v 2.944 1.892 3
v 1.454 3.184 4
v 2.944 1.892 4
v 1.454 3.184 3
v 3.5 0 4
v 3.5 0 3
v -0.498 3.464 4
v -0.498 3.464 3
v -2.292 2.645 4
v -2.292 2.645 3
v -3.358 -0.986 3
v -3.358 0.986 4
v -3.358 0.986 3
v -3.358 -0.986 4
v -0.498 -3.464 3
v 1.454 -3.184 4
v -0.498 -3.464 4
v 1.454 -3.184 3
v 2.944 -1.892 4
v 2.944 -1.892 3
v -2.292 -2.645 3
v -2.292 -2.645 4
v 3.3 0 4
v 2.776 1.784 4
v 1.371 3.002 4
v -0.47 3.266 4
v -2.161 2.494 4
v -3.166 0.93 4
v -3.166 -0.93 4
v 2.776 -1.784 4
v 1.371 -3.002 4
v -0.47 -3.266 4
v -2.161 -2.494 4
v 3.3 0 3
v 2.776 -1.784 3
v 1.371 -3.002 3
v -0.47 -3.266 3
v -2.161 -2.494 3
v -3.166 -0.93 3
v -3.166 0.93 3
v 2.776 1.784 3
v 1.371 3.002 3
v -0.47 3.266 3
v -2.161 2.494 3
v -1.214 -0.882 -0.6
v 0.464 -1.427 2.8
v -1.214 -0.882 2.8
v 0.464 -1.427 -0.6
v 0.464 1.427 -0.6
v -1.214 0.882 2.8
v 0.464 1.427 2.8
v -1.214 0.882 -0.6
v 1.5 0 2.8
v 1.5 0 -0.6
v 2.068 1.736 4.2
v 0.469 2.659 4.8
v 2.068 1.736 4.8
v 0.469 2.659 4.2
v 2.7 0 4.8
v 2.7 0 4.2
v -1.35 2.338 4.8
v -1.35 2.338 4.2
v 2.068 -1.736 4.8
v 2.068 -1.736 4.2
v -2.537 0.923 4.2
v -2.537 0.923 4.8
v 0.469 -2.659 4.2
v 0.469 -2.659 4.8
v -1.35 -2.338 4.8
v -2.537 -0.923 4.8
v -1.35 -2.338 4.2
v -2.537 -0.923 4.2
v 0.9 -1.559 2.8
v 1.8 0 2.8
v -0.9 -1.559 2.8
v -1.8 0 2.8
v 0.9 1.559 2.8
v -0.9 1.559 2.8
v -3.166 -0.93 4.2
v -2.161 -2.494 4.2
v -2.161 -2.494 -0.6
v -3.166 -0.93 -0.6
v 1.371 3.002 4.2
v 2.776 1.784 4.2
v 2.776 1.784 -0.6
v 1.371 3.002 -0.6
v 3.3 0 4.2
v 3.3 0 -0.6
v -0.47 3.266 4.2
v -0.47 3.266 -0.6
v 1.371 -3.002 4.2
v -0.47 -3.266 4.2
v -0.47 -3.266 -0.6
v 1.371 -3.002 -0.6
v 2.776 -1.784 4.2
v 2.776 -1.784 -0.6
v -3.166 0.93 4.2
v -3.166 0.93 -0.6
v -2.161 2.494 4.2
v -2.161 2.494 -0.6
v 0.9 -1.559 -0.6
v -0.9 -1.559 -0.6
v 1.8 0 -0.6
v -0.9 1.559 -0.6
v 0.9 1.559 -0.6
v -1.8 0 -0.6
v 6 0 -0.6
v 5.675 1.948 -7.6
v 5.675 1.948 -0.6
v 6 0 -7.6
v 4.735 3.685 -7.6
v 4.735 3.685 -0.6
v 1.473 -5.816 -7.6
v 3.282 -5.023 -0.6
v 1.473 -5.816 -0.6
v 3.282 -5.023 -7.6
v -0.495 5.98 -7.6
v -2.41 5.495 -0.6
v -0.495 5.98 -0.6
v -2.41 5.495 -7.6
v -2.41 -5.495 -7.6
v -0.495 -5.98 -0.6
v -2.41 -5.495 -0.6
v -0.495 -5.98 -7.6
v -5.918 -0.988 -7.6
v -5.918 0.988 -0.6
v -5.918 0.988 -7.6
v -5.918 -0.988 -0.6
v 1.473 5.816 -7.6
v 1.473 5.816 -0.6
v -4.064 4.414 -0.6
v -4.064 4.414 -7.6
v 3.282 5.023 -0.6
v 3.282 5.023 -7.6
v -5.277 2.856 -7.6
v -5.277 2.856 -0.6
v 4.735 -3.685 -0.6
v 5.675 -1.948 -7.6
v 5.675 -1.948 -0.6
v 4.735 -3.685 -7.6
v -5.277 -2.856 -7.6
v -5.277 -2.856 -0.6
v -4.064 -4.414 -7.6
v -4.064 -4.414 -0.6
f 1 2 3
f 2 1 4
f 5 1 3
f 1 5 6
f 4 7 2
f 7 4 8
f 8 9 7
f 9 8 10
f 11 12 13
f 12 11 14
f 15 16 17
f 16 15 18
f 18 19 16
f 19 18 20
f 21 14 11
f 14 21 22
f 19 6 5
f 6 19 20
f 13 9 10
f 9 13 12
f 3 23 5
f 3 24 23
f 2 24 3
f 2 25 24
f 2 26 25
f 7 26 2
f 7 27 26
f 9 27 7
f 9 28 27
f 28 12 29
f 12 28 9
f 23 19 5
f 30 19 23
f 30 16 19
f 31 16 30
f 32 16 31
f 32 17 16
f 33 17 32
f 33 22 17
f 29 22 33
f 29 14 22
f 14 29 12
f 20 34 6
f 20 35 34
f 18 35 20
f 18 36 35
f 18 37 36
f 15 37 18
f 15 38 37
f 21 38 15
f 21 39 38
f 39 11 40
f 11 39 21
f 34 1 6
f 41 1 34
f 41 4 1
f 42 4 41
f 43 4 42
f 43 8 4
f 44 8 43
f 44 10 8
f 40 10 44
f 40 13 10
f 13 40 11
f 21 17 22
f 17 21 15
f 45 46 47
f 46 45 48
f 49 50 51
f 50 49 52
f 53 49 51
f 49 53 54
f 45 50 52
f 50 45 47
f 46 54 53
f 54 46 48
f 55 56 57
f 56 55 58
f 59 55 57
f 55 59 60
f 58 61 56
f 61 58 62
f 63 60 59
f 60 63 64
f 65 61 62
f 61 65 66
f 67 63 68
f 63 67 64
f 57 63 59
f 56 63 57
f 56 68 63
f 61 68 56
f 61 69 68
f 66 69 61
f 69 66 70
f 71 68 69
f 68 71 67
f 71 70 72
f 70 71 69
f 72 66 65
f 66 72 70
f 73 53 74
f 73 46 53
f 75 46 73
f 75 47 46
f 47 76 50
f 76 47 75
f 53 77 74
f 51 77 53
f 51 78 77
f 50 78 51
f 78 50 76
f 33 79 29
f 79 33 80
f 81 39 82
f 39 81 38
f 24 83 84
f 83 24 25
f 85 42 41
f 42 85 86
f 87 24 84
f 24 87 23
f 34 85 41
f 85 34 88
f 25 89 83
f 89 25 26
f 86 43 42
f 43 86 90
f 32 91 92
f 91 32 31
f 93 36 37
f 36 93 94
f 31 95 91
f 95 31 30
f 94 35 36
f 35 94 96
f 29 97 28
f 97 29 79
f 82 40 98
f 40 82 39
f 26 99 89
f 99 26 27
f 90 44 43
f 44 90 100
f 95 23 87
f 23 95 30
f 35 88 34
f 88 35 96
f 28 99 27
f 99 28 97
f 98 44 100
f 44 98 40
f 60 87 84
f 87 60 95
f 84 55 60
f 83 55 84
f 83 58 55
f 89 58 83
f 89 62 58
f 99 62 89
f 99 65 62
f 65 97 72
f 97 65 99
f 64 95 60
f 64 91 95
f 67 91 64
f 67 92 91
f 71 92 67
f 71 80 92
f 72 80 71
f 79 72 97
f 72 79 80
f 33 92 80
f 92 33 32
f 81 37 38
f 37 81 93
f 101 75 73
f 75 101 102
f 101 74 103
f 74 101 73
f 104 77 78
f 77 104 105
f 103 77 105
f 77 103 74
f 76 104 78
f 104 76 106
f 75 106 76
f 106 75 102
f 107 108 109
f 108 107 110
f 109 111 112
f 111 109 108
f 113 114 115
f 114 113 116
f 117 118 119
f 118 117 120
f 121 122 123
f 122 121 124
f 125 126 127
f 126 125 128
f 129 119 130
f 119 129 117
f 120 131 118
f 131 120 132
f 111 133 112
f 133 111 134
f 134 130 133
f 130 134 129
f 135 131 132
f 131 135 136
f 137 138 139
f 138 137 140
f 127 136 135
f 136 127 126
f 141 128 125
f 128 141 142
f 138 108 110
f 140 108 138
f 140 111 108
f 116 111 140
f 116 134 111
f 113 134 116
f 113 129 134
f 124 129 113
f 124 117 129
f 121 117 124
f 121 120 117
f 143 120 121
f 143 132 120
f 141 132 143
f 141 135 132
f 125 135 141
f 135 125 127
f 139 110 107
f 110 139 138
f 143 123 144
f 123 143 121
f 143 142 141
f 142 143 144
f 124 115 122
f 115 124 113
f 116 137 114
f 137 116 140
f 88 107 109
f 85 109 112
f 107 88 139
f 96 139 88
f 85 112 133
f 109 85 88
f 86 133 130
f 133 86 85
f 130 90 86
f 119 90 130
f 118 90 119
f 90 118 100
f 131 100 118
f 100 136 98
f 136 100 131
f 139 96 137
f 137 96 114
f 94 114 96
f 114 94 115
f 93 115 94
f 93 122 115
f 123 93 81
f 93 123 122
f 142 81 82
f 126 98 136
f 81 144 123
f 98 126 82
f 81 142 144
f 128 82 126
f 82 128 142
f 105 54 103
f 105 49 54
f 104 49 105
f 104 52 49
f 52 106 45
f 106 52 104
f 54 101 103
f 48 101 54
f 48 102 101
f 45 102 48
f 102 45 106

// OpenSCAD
// Parameters
shaft_diameter_mm = 3; //[1.5:6:0.1]
length_mm = 10; //[5:20:0.5]
head_diameter_mm = 5.4; //[2.7:10.8:0.1]
head_height_mm = 2; //[1:4:0.1]

// Use 1–2mm overlap to guarantee watertight connections
overlap_mm = 1.2; //[0.2:2:0.1]

washer_outer_diameter_mm = 7; //[4:14:0.1]
washer_thickness_mm = 1; //[0.5:2:0.1]
pcb_spacer_height_mm = 6; //[3:12:0.5]
pcb_spacer_wall_mm = 1.8; //[0.9:3.6:0.1]
buzzer_body_diameter_mm = 12; //[6:24:0.5]
buzzer_body_height_mm = 7; //[3.5:14:0.5]

// Derived dimensions / Z layout (all centered on Z axis)
shaft_len = length_mm - head_height_mm;

// Place head on top of shaft with overlap
z_shaft_center = 0;
z_head_center  = (shaft_len/2 + head_height_mm/2 - overlap_mm);

// Washer sits under head, overlapping both head and spacer
z_washer_center = (z_head_center - head_height_mm/2 - washer_thickness_mm/2 + overlap_mm);

// Spacer sits under washer, overlapping washer and buzzer
z_spacer_center = (z_washer_center - washer_thickness_mm/2 - pcb_spacer_height_mm/2 + overlap_mm);

// Buzzer sits under spacer, overlapping spacer
z_buzzer_center = (z_spacer_center - pcb_spacer_height_mm/2 - buzzer_body_height_mm/2 + overlap_mm);

// Screw and Washer - connected geometry
module screw_and_washer() {
  // Shaft
  color("DimGray")
    translate([0, 0, z_shaft_center])
      cylinder(h=shaft_len, r=shaft_diameter_mm/2, center=true);

  // Pan Head (overlaps shaft)
  color("DimGray")
    translate([0, 0, z_head_center])
      cylinder(h=head_height_mm, r=head_diameter_mm/2, center=true);

  // Washer (overlaps head and spacer)
  color("DimGray")
    difference() {
      translate([0, 0, z_washer_center])
        cylinder(h=washer_thickness_mm, r=washer_outer_diameter_mm/2, center=true);
      translate([0, 0, z_washer_center])
        cylinder(h=washer_thickness_mm + 2*overlap_mm, r=shaft_diameter_mm/2 + overlap_mm/4, center=true);
    }
}

// PCB Spacer - connected to washer and provides through-hole for shaft
module pcb_spacer() {
  color("Silver")
    difference() {
      translate([0, 0, z_spacer_center])
        cylinder(h=pcb_spacer_height_mm, r=shaft_diameter_mm/2 + pcb_spacer_wall_mm, center=true);
      translate([0, 0, z_spacer_center])
        cylinder(h=pcb_spacer_height_mm + 2*overlap_mm, r=shaft_diameter_mm/2 + overlap_mm/4, center=true);
    }
}

// Buzzer - connected to spacer (slight overlap)
module buzzer() {
  color("Black")
    translate([0, 0, z_buzzer_center])
      cylinder(h=buzzer_body_height_mm, r=buzzer_body_diameter_mm/2, center=true);
}

// Assembly - single connected solid
module assembly() {
  union() {
    screw_and_washer();
    pcb_spacer();
    buzzer();
  }
}

assembly();
